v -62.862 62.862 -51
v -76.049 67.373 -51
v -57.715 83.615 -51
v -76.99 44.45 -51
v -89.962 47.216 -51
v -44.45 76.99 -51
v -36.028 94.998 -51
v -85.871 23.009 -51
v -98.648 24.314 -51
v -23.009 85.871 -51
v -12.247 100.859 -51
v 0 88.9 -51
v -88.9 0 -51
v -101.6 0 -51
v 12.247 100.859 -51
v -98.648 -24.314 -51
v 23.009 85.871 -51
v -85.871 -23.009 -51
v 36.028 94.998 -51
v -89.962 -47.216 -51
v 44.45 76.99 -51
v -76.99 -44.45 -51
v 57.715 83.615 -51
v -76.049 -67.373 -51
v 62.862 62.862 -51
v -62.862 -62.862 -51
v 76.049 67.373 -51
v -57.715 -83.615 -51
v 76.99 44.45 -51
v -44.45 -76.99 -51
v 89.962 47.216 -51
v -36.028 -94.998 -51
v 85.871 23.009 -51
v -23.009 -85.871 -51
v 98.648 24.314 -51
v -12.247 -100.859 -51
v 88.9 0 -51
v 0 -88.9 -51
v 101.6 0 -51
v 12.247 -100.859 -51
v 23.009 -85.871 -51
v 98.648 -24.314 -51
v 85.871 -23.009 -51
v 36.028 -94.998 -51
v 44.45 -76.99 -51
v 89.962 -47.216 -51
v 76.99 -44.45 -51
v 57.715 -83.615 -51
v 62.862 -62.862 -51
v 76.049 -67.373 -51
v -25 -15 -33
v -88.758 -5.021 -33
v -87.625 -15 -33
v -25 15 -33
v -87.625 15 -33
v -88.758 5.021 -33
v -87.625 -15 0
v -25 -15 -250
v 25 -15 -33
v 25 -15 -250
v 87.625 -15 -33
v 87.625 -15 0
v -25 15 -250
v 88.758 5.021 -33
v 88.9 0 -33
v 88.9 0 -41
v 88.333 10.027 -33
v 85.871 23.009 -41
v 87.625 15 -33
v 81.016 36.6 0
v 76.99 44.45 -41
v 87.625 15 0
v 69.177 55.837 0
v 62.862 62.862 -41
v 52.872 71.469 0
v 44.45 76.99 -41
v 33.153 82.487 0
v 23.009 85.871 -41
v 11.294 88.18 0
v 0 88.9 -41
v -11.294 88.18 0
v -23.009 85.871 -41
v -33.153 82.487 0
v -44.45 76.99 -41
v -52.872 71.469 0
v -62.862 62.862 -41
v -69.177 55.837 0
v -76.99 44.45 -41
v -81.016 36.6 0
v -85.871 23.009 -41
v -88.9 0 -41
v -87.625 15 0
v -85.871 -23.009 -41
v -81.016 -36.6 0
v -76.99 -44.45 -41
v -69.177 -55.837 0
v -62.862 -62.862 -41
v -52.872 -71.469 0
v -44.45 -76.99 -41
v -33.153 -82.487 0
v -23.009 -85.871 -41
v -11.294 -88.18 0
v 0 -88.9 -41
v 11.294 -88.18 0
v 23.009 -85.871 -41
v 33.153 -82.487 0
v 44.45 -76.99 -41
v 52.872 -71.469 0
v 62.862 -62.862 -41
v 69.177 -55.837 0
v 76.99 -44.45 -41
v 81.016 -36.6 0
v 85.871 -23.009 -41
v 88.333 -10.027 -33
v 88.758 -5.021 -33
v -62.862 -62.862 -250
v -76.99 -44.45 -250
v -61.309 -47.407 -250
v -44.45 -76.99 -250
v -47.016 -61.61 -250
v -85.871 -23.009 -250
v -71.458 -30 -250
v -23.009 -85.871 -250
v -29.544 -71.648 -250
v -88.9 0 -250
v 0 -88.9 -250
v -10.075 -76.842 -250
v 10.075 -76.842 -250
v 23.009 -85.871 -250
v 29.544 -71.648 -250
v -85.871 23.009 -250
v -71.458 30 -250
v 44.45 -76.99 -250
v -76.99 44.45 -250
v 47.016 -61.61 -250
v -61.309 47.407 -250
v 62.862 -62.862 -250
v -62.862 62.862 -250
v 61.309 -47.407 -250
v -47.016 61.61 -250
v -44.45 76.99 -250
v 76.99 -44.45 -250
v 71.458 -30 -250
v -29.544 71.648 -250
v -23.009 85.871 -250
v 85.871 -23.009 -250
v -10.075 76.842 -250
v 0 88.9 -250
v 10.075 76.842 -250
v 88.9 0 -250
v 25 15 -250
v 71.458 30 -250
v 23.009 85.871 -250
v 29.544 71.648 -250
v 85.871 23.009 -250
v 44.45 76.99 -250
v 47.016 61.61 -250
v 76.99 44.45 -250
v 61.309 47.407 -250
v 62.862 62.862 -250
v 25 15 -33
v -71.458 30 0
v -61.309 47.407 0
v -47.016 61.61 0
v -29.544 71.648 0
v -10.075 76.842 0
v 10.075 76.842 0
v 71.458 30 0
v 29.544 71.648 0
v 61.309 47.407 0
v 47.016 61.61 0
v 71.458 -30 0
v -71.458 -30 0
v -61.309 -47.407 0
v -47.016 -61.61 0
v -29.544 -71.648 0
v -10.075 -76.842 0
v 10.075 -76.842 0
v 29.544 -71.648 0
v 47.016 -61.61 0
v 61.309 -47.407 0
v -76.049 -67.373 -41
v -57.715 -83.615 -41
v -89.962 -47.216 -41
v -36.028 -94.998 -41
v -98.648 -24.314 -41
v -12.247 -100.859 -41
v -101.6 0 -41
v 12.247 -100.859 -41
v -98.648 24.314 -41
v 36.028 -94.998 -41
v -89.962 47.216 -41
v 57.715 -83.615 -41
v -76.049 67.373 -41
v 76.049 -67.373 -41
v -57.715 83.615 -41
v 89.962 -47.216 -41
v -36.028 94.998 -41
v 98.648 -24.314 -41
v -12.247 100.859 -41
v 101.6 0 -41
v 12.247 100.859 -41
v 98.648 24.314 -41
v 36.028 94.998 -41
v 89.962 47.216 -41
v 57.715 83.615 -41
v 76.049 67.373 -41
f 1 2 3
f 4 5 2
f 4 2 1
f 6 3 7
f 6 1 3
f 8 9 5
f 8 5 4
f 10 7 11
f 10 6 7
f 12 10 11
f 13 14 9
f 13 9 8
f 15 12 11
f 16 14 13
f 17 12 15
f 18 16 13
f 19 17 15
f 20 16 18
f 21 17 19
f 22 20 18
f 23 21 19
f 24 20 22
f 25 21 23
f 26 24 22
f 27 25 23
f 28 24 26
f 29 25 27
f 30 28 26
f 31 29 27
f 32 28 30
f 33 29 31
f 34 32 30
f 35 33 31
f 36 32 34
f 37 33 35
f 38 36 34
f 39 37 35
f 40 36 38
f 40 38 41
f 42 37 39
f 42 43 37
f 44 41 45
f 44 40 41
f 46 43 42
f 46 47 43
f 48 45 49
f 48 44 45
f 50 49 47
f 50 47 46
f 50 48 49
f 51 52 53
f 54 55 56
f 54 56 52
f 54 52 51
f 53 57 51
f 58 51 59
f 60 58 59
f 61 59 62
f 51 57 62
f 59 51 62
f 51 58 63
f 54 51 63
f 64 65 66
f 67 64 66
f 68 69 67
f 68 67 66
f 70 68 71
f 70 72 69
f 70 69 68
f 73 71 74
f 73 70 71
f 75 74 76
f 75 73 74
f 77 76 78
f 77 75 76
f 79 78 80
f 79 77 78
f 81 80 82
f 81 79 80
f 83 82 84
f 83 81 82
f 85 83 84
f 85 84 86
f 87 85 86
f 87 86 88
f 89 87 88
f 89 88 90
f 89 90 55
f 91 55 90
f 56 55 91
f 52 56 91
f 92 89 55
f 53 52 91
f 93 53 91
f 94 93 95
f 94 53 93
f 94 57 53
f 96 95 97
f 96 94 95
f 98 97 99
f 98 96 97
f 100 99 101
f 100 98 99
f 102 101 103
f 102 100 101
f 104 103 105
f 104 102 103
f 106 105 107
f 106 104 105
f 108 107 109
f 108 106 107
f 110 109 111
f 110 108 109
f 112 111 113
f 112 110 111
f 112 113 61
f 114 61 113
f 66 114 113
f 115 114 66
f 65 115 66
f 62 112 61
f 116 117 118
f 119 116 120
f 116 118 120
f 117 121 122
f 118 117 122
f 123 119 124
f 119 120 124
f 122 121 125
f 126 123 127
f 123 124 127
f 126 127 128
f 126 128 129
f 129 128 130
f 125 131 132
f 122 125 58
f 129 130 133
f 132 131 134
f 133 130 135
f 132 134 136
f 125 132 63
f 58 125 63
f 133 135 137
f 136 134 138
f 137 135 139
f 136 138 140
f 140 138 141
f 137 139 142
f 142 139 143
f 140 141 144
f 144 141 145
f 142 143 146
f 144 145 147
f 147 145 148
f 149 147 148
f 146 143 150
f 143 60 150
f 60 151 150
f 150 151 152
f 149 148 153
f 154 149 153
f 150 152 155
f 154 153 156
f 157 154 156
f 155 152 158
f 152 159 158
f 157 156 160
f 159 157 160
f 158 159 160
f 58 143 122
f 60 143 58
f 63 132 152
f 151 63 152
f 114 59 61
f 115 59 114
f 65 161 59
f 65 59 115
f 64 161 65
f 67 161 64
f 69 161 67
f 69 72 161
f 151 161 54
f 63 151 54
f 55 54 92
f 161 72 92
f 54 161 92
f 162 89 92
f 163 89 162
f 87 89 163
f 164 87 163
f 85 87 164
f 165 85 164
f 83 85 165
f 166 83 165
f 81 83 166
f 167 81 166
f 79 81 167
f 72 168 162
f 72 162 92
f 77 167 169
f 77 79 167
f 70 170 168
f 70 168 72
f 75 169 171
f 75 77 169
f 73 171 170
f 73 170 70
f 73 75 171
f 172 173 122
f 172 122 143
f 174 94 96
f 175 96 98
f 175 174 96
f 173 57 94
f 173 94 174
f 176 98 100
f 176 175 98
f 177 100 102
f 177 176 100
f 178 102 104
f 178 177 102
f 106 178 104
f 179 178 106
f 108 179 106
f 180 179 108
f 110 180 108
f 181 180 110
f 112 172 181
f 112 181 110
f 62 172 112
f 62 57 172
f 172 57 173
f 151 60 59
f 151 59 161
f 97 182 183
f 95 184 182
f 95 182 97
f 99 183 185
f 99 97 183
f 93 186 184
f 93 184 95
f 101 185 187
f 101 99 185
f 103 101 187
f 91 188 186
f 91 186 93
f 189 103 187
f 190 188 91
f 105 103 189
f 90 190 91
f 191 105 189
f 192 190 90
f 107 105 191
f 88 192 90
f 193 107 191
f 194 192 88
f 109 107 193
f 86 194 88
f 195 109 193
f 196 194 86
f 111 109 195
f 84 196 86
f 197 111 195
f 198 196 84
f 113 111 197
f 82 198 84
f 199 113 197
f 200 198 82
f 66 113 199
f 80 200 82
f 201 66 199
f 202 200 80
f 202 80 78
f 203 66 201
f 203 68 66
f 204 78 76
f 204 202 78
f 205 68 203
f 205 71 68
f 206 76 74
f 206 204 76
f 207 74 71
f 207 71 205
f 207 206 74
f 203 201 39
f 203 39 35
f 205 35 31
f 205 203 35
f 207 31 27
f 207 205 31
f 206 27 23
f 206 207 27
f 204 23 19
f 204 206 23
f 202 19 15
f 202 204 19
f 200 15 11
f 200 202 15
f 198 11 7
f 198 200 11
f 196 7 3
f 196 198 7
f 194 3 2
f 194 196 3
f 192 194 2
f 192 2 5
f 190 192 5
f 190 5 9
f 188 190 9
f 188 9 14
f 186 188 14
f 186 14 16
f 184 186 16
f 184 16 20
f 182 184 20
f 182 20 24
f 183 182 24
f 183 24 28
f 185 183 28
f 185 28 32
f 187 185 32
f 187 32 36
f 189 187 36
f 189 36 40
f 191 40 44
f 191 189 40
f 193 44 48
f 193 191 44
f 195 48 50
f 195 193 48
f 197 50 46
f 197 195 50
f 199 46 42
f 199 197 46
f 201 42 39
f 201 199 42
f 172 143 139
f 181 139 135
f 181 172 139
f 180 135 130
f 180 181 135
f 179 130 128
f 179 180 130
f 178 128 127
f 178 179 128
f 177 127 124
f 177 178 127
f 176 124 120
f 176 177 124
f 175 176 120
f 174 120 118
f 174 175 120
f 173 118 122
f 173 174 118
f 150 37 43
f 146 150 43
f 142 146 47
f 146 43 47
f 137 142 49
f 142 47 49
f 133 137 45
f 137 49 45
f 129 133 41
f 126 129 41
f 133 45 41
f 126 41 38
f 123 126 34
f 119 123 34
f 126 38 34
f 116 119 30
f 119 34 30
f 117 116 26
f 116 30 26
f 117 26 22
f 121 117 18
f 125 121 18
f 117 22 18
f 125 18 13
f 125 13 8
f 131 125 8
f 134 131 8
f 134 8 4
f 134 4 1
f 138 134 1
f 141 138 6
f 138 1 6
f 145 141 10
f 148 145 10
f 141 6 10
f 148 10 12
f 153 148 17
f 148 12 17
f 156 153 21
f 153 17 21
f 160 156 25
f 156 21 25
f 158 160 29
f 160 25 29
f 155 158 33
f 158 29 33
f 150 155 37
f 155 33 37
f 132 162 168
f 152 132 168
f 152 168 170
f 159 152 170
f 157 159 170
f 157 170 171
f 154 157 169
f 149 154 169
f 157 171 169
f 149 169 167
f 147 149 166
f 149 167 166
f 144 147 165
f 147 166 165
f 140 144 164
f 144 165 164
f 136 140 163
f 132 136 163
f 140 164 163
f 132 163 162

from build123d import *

# Parameters (mm, degrees)
SKETCH1_R           = 101.6
BOSS_EXTRUDE1_DEPTH = 250
CUT_EXTRUDE1_DEPTH  = 33
SKETCH4_R           = 101.6
SKETCH4_R_2         = 88.9
CUT_EXTRUDE2_DEPTH  = 41
CUT_EXTRUDE3_START  = -199
SKETCH5_R           = 101.6
SKETCH5_R_2         = 88.9
CUT_EXTRUDE3_DEPTH  = 199
SKETCH6_W           = 50
SKETCH6_H           = 30
CUT_EXTRUDE4_DEPTH  = 287


with BuildPart() as part:
    # Sketch1 → Boss-Extrude1 (new body)
    with BuildSketch(Plane.XY):
        Circle(SKETCH1_R)
    extrude(amount=-BOSS_EXTRUDE1_DEPTH)

    # Sketch2 → Cut-Extrude1 (cut)
    with BuildSketch(Plane.XY):
        with BuildLine():
            Line((87.625395862, 15), (-87.625395862, 15))
            ThreePointArc((-87.625395862, 15), (-88.9, 0), (-87.625395862, -15))
            Line((-87.625395862, -15), (87.625395862, -15))
            ThreePointArc((87.625395862, -15), (88.580775827, -7.527028227), (88.9, 0))
            ThreePointArc((88.9, 0), (88.580775827, 7.527028227), (87.625395862, 15))
        make_face()
    extrude(amount=-CUT_EXTRUDE1_DEPTH, mode=Mode.SUBTRACT)

    # Sketch4 → Cut-Extrude2 (cut)
    with BuildSketch(Plane.XY):
        Circle(SKETCH4_R)
        Circle(SKETCH4_R_2, mode=Mode.SUBTRACT)
    extrude(amount=-CUT_EXTRUDE2_DEPTH, mode=Mode.SUBTRACT)

    # Sketch5 → Cut-Extrude3 (cut)
    with BuildSketch(Plane(origin=(0, 0, -250), x_dir=(-1, 0, 0), z_dir=(0, 0, -1)).offset(CUT_EXTRUDE3_START)):
        with Locations(Location((0, 0, 0), (0, 0, 180))):
            Circle(SKETCH5_R)
        with Locations(Location((0, 0, 0), (0, 0, 180))):
            Circle(SKETCH5_R_2, mode=Mode.SUBTRACT)
    extrude(amount=CUT_EXTRUDE3_DEPTH, mode=Mode.SUBTRACT)

    # Sketch6 → Cut-Extrude4 (cut)
    with BuildSketch(Plane.XY):
        with BuildLine():
            Line((-71.45802964, 30), (71.45802964, 30))
            ThreePointArc((71.45802964, 30), (0, 77.5), (-71.45802964, 30))
        make_face()
        with BuildLine():
            Line((-71.45802964, -30), (71.45802964, -30))
            ThreePointArc((71.45802964, -30), (0, -77.5), (-71.45802964, -30))
        make_face()
        Rectangle(SKETCH6_W, SKETCH6_H)
    extrude(amount=-CUT_EXTRUDE4_DEPTH, mode=Mode.SUBTRACT)


solid = part.part
